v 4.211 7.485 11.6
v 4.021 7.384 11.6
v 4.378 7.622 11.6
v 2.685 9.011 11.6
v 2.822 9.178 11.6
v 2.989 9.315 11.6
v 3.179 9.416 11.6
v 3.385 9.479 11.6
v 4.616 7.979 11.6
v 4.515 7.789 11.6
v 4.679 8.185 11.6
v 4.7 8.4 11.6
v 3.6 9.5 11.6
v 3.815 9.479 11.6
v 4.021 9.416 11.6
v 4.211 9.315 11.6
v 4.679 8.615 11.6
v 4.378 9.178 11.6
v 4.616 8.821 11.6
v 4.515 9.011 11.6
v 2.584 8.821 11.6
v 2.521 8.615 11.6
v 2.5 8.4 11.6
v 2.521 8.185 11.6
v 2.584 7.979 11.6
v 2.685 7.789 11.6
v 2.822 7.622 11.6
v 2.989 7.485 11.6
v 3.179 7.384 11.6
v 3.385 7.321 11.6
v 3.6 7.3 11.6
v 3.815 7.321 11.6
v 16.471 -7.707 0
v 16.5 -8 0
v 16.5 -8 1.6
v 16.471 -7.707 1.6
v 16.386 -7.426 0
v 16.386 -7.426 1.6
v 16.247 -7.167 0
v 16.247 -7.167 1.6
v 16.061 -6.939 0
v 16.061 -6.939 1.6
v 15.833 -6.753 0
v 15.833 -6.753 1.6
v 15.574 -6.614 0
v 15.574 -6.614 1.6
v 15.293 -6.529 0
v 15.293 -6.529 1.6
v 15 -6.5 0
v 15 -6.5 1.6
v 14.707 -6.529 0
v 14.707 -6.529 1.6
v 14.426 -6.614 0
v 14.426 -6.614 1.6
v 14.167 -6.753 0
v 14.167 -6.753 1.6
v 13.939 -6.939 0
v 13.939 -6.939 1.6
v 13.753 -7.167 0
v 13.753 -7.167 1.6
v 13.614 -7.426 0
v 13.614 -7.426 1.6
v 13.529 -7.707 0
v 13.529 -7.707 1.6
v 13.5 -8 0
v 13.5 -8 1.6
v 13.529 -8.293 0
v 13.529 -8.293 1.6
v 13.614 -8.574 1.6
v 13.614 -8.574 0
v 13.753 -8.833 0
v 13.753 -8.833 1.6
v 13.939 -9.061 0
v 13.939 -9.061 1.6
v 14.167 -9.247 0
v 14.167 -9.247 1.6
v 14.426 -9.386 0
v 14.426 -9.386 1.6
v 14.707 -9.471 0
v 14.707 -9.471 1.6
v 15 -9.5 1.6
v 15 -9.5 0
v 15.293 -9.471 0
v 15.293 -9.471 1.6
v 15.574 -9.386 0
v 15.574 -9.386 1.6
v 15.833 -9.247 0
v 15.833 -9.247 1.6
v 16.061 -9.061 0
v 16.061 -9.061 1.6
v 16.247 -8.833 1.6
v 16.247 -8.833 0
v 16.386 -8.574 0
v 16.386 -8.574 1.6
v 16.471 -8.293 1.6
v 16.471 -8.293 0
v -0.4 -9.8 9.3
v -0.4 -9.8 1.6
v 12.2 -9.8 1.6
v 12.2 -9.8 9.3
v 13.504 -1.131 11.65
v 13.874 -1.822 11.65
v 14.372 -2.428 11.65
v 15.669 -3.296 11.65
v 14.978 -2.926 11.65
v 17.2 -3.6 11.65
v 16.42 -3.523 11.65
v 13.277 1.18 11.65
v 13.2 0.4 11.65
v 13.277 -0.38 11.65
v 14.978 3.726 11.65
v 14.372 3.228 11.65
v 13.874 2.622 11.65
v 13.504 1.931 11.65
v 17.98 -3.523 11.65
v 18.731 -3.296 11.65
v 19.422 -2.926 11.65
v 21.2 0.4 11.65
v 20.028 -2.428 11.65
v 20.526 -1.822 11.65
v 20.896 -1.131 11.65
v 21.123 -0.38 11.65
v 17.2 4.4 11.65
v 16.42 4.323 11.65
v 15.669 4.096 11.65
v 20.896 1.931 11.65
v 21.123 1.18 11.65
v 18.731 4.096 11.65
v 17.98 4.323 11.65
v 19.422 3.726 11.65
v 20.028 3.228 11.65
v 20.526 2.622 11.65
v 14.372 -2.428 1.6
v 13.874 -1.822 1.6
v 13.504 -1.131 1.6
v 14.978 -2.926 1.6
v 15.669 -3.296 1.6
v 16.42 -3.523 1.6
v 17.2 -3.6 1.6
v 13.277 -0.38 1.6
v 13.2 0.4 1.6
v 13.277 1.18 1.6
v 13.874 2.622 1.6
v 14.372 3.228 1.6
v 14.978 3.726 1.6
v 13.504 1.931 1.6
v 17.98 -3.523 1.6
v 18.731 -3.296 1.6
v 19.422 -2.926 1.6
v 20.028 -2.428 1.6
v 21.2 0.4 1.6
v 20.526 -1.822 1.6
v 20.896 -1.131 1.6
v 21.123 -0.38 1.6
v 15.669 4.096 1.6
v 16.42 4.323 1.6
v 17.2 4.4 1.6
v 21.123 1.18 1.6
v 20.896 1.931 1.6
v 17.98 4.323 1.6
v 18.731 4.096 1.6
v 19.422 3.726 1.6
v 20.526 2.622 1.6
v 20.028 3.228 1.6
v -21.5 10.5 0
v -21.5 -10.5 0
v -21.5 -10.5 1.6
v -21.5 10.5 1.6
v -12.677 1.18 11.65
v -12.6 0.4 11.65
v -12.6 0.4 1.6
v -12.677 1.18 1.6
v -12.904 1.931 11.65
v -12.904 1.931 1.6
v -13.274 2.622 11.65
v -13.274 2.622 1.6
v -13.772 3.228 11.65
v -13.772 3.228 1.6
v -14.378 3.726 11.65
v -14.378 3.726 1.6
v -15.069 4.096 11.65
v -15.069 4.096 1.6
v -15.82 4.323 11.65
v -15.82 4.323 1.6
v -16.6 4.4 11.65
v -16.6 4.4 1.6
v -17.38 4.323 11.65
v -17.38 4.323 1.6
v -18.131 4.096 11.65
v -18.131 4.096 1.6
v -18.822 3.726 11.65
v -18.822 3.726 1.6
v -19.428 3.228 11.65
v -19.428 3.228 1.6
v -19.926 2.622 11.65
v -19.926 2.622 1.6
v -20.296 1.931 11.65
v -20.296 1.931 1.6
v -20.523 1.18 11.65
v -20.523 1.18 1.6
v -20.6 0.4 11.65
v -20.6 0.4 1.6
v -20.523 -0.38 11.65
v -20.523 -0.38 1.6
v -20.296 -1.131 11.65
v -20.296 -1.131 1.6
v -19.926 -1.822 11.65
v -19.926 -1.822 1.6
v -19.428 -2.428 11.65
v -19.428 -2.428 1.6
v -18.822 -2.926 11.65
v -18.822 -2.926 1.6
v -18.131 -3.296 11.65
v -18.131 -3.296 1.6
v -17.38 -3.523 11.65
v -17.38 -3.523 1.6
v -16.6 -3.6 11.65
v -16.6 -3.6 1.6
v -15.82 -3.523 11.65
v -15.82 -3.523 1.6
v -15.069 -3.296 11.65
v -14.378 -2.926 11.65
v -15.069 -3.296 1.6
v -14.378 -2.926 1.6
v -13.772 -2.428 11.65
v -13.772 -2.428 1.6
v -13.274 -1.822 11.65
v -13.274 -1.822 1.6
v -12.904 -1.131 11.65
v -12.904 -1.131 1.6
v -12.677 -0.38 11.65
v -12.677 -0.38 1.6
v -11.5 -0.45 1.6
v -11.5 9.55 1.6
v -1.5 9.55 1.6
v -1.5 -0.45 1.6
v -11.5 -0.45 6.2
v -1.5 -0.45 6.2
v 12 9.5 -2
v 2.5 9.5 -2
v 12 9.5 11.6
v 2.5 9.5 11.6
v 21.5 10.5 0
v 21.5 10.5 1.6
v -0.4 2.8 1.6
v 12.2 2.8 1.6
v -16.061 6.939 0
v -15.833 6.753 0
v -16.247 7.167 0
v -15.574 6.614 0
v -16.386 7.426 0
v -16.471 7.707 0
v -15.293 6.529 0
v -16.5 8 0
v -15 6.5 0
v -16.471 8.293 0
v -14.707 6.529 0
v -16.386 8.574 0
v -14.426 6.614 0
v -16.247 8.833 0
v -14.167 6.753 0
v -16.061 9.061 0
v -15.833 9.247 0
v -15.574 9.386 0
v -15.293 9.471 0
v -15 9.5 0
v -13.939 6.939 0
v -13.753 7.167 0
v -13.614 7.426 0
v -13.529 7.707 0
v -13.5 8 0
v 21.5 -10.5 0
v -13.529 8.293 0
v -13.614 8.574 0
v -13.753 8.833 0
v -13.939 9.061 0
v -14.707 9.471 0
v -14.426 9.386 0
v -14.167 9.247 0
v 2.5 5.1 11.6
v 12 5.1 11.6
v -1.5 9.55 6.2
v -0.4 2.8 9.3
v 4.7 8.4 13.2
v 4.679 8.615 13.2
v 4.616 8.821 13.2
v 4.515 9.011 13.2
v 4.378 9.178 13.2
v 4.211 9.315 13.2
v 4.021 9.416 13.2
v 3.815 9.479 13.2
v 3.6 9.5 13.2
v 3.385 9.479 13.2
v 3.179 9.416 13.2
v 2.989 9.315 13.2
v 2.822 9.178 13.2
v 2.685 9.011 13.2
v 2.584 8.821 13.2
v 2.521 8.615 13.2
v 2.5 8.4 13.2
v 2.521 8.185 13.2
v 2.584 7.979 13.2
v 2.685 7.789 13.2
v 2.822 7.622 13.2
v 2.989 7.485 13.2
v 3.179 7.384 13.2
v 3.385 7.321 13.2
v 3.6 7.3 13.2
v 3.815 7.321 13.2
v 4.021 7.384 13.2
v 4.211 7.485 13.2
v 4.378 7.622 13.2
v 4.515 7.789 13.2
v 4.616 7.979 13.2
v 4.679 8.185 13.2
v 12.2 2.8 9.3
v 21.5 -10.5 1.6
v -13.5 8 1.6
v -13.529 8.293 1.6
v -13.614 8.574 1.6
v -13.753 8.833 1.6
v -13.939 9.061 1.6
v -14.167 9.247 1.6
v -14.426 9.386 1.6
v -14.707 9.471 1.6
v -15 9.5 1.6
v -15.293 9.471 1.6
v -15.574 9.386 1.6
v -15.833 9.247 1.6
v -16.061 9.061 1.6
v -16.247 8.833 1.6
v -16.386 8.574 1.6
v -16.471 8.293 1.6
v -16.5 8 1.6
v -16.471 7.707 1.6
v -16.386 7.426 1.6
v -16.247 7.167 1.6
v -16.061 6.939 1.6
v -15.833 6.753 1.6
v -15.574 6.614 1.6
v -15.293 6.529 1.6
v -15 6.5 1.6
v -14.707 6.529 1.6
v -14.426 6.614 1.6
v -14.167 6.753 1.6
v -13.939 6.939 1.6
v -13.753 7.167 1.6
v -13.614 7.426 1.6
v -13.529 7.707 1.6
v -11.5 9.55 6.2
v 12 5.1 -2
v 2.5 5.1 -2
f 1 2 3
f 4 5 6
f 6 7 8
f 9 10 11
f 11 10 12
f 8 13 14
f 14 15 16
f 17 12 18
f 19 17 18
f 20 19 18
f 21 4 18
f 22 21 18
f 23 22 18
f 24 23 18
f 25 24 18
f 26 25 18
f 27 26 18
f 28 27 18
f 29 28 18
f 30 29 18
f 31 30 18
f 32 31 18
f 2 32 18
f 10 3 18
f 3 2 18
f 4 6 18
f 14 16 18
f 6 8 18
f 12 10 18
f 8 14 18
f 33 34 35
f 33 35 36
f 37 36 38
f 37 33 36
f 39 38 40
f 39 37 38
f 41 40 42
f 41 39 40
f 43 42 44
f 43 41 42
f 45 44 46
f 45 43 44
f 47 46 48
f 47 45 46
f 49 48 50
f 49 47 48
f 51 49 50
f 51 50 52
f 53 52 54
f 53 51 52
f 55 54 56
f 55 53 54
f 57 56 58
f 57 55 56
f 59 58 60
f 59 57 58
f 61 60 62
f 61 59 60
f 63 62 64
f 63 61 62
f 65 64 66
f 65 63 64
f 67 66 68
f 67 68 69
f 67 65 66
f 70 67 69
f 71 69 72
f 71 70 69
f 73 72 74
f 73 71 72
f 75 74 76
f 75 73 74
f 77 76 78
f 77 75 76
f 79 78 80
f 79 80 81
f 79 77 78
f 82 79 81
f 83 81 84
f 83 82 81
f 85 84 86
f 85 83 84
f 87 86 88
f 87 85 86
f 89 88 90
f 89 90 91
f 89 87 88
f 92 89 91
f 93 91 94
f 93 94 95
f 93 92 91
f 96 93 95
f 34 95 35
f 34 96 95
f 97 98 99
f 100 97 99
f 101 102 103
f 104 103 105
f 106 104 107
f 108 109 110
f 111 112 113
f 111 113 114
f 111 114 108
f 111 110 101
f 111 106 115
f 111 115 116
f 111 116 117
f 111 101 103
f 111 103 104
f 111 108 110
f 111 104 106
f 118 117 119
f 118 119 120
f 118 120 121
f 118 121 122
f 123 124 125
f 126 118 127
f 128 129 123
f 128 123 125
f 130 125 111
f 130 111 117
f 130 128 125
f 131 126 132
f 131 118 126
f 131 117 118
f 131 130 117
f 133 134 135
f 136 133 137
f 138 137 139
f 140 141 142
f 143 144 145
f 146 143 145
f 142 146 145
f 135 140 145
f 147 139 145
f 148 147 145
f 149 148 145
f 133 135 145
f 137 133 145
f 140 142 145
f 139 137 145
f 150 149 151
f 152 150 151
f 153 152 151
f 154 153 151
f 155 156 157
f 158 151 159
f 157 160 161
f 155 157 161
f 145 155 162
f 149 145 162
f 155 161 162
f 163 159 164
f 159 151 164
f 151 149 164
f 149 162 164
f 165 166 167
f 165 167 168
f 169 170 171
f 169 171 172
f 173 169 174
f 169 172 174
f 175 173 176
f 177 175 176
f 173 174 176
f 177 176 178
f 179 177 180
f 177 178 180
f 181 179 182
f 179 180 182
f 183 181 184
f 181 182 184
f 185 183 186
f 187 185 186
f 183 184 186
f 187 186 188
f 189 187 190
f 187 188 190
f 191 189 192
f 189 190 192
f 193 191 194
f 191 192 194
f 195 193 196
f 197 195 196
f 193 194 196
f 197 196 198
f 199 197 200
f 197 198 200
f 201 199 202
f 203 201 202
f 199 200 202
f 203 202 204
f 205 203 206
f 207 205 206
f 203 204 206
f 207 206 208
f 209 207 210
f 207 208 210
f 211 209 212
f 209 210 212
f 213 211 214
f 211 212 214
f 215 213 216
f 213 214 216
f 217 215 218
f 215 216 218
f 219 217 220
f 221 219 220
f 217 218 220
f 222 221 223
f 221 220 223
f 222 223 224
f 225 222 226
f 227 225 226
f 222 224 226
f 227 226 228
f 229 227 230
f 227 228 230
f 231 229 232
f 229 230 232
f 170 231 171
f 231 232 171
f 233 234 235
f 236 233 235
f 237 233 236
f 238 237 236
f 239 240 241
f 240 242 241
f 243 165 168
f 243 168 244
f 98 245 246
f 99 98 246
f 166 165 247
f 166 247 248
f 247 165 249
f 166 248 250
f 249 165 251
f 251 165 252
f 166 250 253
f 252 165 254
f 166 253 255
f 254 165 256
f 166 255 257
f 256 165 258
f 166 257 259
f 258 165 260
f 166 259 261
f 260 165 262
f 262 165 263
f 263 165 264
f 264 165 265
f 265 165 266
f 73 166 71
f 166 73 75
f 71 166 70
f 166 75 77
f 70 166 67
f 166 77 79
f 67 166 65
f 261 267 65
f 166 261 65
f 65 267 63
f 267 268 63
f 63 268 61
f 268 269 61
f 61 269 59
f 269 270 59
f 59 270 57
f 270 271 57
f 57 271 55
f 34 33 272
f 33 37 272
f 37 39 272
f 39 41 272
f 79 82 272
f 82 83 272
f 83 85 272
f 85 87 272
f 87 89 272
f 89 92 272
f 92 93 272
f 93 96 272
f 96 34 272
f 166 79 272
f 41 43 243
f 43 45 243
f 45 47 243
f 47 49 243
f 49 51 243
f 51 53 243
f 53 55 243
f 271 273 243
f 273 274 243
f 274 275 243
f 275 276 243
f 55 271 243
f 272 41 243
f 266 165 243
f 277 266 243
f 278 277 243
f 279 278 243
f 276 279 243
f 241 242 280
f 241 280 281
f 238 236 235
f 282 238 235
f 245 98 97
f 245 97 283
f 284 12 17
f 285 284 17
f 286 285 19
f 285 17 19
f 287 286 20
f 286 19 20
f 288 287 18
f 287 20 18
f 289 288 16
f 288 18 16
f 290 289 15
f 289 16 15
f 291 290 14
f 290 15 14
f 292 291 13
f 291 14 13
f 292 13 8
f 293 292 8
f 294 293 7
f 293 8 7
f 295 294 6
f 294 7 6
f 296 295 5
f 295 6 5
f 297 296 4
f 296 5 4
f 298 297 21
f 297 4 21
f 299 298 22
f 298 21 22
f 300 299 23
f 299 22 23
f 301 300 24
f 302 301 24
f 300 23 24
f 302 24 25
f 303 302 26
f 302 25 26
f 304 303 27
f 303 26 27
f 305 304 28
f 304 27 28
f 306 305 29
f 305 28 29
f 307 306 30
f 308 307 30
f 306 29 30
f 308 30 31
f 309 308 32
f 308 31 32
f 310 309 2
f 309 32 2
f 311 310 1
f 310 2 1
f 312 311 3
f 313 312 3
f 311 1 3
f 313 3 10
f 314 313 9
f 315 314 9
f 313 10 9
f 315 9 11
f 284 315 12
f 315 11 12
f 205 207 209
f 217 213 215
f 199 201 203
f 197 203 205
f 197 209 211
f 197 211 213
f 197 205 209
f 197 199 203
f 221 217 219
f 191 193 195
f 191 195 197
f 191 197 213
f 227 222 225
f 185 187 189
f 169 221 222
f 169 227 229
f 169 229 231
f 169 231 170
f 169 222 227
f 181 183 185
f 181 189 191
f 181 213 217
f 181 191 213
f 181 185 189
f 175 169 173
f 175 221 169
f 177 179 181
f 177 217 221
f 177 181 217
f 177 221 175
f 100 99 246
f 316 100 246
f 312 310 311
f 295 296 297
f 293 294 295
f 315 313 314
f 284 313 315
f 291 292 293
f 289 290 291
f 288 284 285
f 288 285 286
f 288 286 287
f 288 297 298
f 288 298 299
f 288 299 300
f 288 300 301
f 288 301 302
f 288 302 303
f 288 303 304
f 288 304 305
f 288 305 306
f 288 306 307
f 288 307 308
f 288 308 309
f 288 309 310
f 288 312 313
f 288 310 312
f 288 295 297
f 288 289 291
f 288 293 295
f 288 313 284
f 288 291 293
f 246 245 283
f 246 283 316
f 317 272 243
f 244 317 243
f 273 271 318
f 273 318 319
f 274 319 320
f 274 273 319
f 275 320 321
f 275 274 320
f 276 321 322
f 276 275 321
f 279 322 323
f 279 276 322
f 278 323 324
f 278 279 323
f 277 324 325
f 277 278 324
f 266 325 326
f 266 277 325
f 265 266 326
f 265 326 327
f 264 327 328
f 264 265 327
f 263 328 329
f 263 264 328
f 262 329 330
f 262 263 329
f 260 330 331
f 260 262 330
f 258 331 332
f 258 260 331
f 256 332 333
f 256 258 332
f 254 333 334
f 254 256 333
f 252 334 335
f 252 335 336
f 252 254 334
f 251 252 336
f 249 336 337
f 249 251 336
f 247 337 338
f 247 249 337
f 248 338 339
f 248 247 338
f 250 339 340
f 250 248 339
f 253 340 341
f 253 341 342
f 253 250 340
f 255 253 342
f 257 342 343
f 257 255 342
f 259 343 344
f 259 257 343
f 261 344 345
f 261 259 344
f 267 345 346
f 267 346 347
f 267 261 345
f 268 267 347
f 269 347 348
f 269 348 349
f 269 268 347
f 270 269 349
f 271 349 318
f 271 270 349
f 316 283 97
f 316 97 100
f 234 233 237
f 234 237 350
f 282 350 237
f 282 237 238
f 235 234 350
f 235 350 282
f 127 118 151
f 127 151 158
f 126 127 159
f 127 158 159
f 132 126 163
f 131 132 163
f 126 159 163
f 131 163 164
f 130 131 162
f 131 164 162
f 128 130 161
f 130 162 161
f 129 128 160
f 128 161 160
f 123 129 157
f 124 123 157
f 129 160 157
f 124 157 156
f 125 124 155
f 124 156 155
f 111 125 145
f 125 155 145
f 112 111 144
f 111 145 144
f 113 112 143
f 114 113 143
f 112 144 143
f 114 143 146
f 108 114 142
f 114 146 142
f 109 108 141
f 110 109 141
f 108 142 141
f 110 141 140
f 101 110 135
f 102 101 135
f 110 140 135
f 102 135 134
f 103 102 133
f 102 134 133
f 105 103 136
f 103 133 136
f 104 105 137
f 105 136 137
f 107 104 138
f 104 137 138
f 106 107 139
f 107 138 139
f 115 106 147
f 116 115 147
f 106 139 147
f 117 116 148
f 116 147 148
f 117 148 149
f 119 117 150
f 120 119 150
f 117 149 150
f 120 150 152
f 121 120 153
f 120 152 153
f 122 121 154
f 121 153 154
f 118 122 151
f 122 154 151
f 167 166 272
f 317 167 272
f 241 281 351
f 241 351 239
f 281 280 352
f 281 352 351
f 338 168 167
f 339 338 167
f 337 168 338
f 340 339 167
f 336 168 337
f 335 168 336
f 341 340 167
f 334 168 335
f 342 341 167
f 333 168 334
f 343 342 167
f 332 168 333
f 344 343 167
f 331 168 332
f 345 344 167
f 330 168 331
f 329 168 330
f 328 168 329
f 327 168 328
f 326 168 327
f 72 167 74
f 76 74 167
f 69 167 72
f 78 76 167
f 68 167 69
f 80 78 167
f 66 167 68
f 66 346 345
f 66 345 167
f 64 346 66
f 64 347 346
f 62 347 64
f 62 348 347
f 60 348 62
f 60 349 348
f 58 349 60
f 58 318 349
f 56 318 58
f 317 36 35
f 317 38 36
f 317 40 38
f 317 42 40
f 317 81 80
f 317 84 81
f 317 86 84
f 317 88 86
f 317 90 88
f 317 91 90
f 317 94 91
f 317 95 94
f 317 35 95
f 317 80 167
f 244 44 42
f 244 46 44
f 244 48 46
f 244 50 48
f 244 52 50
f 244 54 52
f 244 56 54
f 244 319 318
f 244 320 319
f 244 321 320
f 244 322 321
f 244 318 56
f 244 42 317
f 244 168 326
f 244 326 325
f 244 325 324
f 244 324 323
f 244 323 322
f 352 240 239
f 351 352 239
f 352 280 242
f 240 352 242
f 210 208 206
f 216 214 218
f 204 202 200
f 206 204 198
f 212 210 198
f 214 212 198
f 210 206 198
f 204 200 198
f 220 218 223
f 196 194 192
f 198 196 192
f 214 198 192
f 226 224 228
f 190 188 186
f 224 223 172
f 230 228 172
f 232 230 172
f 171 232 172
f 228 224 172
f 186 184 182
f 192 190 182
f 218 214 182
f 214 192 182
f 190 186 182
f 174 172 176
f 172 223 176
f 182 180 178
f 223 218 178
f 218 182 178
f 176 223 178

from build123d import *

# Parameters (mm, degrees)
F0_W          = 43
F0_H          = 21
F0_R          = 1.5
F1_DEPTH      = 1.6
F3_R          = 4
F4_DEPTH      = 10.05
F5_DEPTH      = 10.05
F3_W          = 12.6
F3_H          = 12.6
F6_DEPTH      = 7.7
F3_W_2        = 9.5
F3_H_2        = 4.4
F7_DEPTH      = 10
F7_DEPTH_BACK = 3.6
F3_W_3        = 10
F3_H_3        = 10
F8_DEPTH      = 4.6
F10_R         = 1.1
F11_DEPTH     = 1.6


with BuildPart() as f1:
    # F0 (on Top) → F1 (new body)
    with BuildSketch(Plane.XY):
        Rectangle(F0_W, F0_H)
        with Locations((15, -8)):
            Circle(F0_R, mode=Mode.SUBTRACT)
        with Locations((-15, 8)):
            Circle(F0_R, mode=Mode.SUBTRACT)
    extrude(amount=F1_DEPTH)


with BuildPart() as f4:
    # F3 (on offset) → F4 (new body)
    with BuildSketch(Plane.XY.offset(1.6)):
        with Locations((-16.6, 0.4)):
            Circle(F3_R)
    extrude(amount=F4_DEPTH)


with BuildPart() as f5:
    # F3 (on offset) → F5 (new body)
    with BuildSketch(Plane.XY.offset(1.6)):
        with Locations((17.2, 0.4)):
            Circle(F3_R)
    extrude(amount=F5_DEPTH)


with BuildPart() as f6:
    # F3 (on offset) → F6 (new body)
    with BuildSketch(Plane.XY.offset(1.6)):
        with Locations((5.9, -3.5)):
            Rectangle(F3_W, F3_H)
    extrude(amount=F6_DEPTH)


with BuildPart() as f7:
    # F3 (on offset) → F7 (new body, two sides)
    with BuildSketch(Plane.XY.offset(1.6)) as f7_sk:
        with Locations((7.25, 7.3)):
            Rectangle(F3_W_2, F3_H_2)
    extrude(amount=F7_DEPTH)
    extrude(f7_sk.sketch, amount=-F7_DEPTH_BACK)


with BuildPart() as f8:
    # F3 (on offset) → F8 (new body)
    with BuildSketch(Plane.XY.offset(1.6)):
        with Locations((-6.5, 4.55)):
            Rectangle(F3_W_3, F3_H_3)
    extrude(amount=F8_DEPTH)


with BuildPart() as f11:
    # F10 (on offset) → F11 (new body)
    with BuildSketch(Plane.XY.offset(11.6)):
        with Locations((3.6, 8.4)):
            Circle(F10_R)
    extrude(amount=F11_DEPTH)


solid = Compound([f1.part, f4.part, f5.part, f6.part, f7.part, f8.part, f11.part])
